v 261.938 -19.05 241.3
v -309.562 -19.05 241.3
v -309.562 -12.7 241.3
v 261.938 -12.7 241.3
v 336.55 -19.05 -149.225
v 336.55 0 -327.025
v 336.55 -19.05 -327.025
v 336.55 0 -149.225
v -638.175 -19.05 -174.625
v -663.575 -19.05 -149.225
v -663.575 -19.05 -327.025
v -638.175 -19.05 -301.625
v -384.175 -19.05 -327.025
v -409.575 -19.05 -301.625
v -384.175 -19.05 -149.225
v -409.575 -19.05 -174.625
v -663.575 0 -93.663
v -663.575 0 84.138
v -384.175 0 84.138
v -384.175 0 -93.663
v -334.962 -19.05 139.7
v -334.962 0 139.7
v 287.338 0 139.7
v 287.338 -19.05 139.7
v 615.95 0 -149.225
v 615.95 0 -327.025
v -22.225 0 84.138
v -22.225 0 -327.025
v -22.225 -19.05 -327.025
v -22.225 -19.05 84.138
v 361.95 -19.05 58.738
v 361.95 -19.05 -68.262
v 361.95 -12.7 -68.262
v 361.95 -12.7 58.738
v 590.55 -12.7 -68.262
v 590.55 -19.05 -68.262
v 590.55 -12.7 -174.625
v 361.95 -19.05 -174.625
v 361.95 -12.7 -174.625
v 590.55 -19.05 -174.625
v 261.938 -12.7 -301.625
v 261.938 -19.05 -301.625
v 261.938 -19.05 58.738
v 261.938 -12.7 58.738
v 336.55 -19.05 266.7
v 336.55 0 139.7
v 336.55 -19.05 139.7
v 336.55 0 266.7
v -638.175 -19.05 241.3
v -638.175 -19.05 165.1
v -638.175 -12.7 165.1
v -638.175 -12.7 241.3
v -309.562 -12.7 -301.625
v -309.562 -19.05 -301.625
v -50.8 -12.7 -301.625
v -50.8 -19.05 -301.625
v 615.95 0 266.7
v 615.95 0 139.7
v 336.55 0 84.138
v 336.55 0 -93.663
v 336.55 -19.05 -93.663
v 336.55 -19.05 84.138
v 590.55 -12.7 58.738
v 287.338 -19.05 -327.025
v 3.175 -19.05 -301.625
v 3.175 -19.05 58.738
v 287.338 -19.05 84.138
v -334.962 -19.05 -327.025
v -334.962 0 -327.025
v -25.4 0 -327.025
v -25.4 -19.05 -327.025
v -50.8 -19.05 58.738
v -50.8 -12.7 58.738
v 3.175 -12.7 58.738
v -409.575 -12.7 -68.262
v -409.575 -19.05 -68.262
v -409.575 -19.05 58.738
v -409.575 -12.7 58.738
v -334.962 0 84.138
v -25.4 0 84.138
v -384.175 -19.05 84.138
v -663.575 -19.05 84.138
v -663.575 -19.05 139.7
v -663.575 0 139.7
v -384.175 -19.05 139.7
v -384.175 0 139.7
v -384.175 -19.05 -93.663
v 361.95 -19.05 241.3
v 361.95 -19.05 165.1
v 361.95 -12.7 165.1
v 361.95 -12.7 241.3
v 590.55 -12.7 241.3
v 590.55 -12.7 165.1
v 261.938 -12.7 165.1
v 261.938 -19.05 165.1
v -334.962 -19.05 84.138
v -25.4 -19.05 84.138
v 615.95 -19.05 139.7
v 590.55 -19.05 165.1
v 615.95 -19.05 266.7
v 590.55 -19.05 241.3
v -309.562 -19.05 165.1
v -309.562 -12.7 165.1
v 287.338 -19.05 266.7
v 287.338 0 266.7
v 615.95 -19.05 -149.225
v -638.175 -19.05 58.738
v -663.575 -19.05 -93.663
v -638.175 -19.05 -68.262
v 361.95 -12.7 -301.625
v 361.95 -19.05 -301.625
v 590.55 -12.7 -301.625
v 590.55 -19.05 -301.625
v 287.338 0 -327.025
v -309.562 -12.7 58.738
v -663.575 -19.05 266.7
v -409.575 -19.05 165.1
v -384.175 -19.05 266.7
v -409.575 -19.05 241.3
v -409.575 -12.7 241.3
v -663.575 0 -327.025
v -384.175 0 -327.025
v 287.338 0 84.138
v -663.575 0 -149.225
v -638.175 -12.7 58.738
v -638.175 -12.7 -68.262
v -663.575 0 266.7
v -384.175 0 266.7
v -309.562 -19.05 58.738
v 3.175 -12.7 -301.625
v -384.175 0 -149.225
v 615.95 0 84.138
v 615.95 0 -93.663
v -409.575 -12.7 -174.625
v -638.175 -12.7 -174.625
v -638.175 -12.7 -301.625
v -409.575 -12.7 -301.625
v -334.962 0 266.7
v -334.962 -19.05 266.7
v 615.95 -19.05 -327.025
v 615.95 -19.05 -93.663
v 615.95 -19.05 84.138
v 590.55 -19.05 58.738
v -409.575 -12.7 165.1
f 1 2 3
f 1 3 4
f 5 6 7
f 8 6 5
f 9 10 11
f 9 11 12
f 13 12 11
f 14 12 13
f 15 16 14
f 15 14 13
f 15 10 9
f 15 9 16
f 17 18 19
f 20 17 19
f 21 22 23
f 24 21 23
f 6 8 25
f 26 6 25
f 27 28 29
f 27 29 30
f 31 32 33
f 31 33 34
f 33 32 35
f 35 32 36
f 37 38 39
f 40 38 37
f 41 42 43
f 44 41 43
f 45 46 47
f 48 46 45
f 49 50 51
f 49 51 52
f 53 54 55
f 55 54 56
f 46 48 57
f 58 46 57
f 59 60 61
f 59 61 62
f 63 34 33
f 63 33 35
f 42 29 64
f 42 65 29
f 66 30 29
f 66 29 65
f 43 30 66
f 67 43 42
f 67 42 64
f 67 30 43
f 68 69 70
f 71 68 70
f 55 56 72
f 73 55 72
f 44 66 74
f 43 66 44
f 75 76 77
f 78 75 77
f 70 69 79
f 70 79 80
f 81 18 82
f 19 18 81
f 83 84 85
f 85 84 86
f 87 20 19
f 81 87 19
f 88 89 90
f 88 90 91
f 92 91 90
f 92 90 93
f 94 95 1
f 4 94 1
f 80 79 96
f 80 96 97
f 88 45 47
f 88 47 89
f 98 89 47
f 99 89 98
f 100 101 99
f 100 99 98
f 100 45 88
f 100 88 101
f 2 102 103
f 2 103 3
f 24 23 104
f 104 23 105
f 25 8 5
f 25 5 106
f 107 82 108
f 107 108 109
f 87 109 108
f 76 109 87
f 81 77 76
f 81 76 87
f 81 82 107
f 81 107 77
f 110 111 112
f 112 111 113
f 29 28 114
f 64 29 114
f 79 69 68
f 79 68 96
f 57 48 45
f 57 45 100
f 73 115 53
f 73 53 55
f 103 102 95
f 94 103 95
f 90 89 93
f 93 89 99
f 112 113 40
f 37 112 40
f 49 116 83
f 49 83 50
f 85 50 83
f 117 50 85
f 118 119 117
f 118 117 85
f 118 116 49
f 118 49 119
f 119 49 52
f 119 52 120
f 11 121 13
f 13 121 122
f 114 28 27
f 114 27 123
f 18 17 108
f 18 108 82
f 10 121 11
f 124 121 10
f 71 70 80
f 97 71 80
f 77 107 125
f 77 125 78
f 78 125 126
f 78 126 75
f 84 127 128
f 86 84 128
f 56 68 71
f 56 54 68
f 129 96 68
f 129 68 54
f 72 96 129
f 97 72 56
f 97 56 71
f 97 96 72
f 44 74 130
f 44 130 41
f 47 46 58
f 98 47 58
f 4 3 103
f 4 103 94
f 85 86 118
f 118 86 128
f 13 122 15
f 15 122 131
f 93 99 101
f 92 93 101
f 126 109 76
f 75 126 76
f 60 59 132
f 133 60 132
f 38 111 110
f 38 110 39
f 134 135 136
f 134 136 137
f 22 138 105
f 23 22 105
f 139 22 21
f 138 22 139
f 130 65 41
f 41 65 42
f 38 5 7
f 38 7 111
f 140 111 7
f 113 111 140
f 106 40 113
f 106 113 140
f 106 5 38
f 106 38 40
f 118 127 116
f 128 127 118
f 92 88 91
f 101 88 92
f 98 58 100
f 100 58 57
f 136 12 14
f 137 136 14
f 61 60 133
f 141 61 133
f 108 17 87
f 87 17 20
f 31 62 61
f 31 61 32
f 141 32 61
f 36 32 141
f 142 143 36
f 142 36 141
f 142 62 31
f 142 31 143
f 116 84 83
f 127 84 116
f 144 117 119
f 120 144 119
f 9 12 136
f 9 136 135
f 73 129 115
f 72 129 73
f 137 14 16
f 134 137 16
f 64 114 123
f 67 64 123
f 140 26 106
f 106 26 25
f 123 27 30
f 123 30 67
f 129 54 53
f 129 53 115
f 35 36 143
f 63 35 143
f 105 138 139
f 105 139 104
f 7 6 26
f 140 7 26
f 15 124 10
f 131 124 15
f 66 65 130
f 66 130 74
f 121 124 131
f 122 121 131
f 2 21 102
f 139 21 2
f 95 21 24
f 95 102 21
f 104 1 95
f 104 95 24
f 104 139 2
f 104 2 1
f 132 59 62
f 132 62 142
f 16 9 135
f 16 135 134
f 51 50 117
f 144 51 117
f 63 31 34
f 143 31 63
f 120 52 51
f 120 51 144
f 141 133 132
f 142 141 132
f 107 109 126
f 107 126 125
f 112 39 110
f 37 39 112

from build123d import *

# Parameters (mm, degrees)
F0_W     = 279.4
F0_H     = 127
F0_W_2   = 622.3
F0_H_2   = 177.8
F0_W_3   = 309.5625
F0_H_3   = 411.1625
F1_DEPTH = 19.05
F2_W     = 228.6
F2_H     = 76.2
F2_H_2   = 127
F2_W_2   = 258.7625
F2_H_3   = 360.3625
F2_W_3   = 571.5
F3_DEPTH = 6.35


with BuildPart() as f1:
    # F0 (on Front) → F1 (new body)
    with BuildSketch(Plane.XZ):
        with Locations((-523.875, 203.2)):
            Rectangle(F0_W, F0_H)
        with Locations((-23.8125, 203.2)):
            Rectangle(F0_W_2, F0_H)
        with Locations((476.25, 203.2)):
            Rectangle(F0_W, F0_H)
        with Locations((476.25, -4.7625)):
            Rectangle(F0_W, F0_H_2)
        with Locations((476.25, -238.125)):
            Rectangle(F0_W, F0_H_2)
        with Locations((132.55625, -121.44375)):
            Rectangle(F0_W_3, F0_H_3)
        with Locations((-180.18125, -121.44375)):
            Rectangle(F0_W_3, F0_H_3)
        with Locations((-523.875, -4.7625)):
            Rectangle(F0_W, F0_H_2)
        with Locations((-523.875, -238.125)):
            Rectangle(F0_W, F0_H_2)
    extrude(amount=F1_DEPTH)

    # F2 (on face) → F3 (cut)
    with BuildSketch(Plane.XZ.offset(19.05)):
        with Locations((-523.875, 203.2)):
            Rectangle(F2_W, F2_H)
        with Locations((-523.875, -4.7625)):
            Rectangle(F2_W, F2_H_2)
        with Locations((-523.875, -238.125)):
            Rectangle(F2_W, F2_H_2)
        with Locations((-180.18125, -121.44375)):
            Rectangle(F2_W_2, F2_H_3)
        with Locations((-23.8125, 203.2)):
            Rectangle(F2_W_3, F2_H)
        with Locations((132.55625, -121.44375)):
            Rectangle(F2_W_2, F2_H_3)
        with Locations((476.25, 203.2)):
            Rectangle(F2_W, F2_H)
        with Locations((476.25, -4.7625)):
            Rectangle(F2_W, F2_H_2)
        with Locations((476.25, -238.125)):
            Rectangle(F2_W, F2_H_2)
    extrude(amount=-F3_DEPTH, mode=Mode.SUBTRACT)


solid = f1.part
